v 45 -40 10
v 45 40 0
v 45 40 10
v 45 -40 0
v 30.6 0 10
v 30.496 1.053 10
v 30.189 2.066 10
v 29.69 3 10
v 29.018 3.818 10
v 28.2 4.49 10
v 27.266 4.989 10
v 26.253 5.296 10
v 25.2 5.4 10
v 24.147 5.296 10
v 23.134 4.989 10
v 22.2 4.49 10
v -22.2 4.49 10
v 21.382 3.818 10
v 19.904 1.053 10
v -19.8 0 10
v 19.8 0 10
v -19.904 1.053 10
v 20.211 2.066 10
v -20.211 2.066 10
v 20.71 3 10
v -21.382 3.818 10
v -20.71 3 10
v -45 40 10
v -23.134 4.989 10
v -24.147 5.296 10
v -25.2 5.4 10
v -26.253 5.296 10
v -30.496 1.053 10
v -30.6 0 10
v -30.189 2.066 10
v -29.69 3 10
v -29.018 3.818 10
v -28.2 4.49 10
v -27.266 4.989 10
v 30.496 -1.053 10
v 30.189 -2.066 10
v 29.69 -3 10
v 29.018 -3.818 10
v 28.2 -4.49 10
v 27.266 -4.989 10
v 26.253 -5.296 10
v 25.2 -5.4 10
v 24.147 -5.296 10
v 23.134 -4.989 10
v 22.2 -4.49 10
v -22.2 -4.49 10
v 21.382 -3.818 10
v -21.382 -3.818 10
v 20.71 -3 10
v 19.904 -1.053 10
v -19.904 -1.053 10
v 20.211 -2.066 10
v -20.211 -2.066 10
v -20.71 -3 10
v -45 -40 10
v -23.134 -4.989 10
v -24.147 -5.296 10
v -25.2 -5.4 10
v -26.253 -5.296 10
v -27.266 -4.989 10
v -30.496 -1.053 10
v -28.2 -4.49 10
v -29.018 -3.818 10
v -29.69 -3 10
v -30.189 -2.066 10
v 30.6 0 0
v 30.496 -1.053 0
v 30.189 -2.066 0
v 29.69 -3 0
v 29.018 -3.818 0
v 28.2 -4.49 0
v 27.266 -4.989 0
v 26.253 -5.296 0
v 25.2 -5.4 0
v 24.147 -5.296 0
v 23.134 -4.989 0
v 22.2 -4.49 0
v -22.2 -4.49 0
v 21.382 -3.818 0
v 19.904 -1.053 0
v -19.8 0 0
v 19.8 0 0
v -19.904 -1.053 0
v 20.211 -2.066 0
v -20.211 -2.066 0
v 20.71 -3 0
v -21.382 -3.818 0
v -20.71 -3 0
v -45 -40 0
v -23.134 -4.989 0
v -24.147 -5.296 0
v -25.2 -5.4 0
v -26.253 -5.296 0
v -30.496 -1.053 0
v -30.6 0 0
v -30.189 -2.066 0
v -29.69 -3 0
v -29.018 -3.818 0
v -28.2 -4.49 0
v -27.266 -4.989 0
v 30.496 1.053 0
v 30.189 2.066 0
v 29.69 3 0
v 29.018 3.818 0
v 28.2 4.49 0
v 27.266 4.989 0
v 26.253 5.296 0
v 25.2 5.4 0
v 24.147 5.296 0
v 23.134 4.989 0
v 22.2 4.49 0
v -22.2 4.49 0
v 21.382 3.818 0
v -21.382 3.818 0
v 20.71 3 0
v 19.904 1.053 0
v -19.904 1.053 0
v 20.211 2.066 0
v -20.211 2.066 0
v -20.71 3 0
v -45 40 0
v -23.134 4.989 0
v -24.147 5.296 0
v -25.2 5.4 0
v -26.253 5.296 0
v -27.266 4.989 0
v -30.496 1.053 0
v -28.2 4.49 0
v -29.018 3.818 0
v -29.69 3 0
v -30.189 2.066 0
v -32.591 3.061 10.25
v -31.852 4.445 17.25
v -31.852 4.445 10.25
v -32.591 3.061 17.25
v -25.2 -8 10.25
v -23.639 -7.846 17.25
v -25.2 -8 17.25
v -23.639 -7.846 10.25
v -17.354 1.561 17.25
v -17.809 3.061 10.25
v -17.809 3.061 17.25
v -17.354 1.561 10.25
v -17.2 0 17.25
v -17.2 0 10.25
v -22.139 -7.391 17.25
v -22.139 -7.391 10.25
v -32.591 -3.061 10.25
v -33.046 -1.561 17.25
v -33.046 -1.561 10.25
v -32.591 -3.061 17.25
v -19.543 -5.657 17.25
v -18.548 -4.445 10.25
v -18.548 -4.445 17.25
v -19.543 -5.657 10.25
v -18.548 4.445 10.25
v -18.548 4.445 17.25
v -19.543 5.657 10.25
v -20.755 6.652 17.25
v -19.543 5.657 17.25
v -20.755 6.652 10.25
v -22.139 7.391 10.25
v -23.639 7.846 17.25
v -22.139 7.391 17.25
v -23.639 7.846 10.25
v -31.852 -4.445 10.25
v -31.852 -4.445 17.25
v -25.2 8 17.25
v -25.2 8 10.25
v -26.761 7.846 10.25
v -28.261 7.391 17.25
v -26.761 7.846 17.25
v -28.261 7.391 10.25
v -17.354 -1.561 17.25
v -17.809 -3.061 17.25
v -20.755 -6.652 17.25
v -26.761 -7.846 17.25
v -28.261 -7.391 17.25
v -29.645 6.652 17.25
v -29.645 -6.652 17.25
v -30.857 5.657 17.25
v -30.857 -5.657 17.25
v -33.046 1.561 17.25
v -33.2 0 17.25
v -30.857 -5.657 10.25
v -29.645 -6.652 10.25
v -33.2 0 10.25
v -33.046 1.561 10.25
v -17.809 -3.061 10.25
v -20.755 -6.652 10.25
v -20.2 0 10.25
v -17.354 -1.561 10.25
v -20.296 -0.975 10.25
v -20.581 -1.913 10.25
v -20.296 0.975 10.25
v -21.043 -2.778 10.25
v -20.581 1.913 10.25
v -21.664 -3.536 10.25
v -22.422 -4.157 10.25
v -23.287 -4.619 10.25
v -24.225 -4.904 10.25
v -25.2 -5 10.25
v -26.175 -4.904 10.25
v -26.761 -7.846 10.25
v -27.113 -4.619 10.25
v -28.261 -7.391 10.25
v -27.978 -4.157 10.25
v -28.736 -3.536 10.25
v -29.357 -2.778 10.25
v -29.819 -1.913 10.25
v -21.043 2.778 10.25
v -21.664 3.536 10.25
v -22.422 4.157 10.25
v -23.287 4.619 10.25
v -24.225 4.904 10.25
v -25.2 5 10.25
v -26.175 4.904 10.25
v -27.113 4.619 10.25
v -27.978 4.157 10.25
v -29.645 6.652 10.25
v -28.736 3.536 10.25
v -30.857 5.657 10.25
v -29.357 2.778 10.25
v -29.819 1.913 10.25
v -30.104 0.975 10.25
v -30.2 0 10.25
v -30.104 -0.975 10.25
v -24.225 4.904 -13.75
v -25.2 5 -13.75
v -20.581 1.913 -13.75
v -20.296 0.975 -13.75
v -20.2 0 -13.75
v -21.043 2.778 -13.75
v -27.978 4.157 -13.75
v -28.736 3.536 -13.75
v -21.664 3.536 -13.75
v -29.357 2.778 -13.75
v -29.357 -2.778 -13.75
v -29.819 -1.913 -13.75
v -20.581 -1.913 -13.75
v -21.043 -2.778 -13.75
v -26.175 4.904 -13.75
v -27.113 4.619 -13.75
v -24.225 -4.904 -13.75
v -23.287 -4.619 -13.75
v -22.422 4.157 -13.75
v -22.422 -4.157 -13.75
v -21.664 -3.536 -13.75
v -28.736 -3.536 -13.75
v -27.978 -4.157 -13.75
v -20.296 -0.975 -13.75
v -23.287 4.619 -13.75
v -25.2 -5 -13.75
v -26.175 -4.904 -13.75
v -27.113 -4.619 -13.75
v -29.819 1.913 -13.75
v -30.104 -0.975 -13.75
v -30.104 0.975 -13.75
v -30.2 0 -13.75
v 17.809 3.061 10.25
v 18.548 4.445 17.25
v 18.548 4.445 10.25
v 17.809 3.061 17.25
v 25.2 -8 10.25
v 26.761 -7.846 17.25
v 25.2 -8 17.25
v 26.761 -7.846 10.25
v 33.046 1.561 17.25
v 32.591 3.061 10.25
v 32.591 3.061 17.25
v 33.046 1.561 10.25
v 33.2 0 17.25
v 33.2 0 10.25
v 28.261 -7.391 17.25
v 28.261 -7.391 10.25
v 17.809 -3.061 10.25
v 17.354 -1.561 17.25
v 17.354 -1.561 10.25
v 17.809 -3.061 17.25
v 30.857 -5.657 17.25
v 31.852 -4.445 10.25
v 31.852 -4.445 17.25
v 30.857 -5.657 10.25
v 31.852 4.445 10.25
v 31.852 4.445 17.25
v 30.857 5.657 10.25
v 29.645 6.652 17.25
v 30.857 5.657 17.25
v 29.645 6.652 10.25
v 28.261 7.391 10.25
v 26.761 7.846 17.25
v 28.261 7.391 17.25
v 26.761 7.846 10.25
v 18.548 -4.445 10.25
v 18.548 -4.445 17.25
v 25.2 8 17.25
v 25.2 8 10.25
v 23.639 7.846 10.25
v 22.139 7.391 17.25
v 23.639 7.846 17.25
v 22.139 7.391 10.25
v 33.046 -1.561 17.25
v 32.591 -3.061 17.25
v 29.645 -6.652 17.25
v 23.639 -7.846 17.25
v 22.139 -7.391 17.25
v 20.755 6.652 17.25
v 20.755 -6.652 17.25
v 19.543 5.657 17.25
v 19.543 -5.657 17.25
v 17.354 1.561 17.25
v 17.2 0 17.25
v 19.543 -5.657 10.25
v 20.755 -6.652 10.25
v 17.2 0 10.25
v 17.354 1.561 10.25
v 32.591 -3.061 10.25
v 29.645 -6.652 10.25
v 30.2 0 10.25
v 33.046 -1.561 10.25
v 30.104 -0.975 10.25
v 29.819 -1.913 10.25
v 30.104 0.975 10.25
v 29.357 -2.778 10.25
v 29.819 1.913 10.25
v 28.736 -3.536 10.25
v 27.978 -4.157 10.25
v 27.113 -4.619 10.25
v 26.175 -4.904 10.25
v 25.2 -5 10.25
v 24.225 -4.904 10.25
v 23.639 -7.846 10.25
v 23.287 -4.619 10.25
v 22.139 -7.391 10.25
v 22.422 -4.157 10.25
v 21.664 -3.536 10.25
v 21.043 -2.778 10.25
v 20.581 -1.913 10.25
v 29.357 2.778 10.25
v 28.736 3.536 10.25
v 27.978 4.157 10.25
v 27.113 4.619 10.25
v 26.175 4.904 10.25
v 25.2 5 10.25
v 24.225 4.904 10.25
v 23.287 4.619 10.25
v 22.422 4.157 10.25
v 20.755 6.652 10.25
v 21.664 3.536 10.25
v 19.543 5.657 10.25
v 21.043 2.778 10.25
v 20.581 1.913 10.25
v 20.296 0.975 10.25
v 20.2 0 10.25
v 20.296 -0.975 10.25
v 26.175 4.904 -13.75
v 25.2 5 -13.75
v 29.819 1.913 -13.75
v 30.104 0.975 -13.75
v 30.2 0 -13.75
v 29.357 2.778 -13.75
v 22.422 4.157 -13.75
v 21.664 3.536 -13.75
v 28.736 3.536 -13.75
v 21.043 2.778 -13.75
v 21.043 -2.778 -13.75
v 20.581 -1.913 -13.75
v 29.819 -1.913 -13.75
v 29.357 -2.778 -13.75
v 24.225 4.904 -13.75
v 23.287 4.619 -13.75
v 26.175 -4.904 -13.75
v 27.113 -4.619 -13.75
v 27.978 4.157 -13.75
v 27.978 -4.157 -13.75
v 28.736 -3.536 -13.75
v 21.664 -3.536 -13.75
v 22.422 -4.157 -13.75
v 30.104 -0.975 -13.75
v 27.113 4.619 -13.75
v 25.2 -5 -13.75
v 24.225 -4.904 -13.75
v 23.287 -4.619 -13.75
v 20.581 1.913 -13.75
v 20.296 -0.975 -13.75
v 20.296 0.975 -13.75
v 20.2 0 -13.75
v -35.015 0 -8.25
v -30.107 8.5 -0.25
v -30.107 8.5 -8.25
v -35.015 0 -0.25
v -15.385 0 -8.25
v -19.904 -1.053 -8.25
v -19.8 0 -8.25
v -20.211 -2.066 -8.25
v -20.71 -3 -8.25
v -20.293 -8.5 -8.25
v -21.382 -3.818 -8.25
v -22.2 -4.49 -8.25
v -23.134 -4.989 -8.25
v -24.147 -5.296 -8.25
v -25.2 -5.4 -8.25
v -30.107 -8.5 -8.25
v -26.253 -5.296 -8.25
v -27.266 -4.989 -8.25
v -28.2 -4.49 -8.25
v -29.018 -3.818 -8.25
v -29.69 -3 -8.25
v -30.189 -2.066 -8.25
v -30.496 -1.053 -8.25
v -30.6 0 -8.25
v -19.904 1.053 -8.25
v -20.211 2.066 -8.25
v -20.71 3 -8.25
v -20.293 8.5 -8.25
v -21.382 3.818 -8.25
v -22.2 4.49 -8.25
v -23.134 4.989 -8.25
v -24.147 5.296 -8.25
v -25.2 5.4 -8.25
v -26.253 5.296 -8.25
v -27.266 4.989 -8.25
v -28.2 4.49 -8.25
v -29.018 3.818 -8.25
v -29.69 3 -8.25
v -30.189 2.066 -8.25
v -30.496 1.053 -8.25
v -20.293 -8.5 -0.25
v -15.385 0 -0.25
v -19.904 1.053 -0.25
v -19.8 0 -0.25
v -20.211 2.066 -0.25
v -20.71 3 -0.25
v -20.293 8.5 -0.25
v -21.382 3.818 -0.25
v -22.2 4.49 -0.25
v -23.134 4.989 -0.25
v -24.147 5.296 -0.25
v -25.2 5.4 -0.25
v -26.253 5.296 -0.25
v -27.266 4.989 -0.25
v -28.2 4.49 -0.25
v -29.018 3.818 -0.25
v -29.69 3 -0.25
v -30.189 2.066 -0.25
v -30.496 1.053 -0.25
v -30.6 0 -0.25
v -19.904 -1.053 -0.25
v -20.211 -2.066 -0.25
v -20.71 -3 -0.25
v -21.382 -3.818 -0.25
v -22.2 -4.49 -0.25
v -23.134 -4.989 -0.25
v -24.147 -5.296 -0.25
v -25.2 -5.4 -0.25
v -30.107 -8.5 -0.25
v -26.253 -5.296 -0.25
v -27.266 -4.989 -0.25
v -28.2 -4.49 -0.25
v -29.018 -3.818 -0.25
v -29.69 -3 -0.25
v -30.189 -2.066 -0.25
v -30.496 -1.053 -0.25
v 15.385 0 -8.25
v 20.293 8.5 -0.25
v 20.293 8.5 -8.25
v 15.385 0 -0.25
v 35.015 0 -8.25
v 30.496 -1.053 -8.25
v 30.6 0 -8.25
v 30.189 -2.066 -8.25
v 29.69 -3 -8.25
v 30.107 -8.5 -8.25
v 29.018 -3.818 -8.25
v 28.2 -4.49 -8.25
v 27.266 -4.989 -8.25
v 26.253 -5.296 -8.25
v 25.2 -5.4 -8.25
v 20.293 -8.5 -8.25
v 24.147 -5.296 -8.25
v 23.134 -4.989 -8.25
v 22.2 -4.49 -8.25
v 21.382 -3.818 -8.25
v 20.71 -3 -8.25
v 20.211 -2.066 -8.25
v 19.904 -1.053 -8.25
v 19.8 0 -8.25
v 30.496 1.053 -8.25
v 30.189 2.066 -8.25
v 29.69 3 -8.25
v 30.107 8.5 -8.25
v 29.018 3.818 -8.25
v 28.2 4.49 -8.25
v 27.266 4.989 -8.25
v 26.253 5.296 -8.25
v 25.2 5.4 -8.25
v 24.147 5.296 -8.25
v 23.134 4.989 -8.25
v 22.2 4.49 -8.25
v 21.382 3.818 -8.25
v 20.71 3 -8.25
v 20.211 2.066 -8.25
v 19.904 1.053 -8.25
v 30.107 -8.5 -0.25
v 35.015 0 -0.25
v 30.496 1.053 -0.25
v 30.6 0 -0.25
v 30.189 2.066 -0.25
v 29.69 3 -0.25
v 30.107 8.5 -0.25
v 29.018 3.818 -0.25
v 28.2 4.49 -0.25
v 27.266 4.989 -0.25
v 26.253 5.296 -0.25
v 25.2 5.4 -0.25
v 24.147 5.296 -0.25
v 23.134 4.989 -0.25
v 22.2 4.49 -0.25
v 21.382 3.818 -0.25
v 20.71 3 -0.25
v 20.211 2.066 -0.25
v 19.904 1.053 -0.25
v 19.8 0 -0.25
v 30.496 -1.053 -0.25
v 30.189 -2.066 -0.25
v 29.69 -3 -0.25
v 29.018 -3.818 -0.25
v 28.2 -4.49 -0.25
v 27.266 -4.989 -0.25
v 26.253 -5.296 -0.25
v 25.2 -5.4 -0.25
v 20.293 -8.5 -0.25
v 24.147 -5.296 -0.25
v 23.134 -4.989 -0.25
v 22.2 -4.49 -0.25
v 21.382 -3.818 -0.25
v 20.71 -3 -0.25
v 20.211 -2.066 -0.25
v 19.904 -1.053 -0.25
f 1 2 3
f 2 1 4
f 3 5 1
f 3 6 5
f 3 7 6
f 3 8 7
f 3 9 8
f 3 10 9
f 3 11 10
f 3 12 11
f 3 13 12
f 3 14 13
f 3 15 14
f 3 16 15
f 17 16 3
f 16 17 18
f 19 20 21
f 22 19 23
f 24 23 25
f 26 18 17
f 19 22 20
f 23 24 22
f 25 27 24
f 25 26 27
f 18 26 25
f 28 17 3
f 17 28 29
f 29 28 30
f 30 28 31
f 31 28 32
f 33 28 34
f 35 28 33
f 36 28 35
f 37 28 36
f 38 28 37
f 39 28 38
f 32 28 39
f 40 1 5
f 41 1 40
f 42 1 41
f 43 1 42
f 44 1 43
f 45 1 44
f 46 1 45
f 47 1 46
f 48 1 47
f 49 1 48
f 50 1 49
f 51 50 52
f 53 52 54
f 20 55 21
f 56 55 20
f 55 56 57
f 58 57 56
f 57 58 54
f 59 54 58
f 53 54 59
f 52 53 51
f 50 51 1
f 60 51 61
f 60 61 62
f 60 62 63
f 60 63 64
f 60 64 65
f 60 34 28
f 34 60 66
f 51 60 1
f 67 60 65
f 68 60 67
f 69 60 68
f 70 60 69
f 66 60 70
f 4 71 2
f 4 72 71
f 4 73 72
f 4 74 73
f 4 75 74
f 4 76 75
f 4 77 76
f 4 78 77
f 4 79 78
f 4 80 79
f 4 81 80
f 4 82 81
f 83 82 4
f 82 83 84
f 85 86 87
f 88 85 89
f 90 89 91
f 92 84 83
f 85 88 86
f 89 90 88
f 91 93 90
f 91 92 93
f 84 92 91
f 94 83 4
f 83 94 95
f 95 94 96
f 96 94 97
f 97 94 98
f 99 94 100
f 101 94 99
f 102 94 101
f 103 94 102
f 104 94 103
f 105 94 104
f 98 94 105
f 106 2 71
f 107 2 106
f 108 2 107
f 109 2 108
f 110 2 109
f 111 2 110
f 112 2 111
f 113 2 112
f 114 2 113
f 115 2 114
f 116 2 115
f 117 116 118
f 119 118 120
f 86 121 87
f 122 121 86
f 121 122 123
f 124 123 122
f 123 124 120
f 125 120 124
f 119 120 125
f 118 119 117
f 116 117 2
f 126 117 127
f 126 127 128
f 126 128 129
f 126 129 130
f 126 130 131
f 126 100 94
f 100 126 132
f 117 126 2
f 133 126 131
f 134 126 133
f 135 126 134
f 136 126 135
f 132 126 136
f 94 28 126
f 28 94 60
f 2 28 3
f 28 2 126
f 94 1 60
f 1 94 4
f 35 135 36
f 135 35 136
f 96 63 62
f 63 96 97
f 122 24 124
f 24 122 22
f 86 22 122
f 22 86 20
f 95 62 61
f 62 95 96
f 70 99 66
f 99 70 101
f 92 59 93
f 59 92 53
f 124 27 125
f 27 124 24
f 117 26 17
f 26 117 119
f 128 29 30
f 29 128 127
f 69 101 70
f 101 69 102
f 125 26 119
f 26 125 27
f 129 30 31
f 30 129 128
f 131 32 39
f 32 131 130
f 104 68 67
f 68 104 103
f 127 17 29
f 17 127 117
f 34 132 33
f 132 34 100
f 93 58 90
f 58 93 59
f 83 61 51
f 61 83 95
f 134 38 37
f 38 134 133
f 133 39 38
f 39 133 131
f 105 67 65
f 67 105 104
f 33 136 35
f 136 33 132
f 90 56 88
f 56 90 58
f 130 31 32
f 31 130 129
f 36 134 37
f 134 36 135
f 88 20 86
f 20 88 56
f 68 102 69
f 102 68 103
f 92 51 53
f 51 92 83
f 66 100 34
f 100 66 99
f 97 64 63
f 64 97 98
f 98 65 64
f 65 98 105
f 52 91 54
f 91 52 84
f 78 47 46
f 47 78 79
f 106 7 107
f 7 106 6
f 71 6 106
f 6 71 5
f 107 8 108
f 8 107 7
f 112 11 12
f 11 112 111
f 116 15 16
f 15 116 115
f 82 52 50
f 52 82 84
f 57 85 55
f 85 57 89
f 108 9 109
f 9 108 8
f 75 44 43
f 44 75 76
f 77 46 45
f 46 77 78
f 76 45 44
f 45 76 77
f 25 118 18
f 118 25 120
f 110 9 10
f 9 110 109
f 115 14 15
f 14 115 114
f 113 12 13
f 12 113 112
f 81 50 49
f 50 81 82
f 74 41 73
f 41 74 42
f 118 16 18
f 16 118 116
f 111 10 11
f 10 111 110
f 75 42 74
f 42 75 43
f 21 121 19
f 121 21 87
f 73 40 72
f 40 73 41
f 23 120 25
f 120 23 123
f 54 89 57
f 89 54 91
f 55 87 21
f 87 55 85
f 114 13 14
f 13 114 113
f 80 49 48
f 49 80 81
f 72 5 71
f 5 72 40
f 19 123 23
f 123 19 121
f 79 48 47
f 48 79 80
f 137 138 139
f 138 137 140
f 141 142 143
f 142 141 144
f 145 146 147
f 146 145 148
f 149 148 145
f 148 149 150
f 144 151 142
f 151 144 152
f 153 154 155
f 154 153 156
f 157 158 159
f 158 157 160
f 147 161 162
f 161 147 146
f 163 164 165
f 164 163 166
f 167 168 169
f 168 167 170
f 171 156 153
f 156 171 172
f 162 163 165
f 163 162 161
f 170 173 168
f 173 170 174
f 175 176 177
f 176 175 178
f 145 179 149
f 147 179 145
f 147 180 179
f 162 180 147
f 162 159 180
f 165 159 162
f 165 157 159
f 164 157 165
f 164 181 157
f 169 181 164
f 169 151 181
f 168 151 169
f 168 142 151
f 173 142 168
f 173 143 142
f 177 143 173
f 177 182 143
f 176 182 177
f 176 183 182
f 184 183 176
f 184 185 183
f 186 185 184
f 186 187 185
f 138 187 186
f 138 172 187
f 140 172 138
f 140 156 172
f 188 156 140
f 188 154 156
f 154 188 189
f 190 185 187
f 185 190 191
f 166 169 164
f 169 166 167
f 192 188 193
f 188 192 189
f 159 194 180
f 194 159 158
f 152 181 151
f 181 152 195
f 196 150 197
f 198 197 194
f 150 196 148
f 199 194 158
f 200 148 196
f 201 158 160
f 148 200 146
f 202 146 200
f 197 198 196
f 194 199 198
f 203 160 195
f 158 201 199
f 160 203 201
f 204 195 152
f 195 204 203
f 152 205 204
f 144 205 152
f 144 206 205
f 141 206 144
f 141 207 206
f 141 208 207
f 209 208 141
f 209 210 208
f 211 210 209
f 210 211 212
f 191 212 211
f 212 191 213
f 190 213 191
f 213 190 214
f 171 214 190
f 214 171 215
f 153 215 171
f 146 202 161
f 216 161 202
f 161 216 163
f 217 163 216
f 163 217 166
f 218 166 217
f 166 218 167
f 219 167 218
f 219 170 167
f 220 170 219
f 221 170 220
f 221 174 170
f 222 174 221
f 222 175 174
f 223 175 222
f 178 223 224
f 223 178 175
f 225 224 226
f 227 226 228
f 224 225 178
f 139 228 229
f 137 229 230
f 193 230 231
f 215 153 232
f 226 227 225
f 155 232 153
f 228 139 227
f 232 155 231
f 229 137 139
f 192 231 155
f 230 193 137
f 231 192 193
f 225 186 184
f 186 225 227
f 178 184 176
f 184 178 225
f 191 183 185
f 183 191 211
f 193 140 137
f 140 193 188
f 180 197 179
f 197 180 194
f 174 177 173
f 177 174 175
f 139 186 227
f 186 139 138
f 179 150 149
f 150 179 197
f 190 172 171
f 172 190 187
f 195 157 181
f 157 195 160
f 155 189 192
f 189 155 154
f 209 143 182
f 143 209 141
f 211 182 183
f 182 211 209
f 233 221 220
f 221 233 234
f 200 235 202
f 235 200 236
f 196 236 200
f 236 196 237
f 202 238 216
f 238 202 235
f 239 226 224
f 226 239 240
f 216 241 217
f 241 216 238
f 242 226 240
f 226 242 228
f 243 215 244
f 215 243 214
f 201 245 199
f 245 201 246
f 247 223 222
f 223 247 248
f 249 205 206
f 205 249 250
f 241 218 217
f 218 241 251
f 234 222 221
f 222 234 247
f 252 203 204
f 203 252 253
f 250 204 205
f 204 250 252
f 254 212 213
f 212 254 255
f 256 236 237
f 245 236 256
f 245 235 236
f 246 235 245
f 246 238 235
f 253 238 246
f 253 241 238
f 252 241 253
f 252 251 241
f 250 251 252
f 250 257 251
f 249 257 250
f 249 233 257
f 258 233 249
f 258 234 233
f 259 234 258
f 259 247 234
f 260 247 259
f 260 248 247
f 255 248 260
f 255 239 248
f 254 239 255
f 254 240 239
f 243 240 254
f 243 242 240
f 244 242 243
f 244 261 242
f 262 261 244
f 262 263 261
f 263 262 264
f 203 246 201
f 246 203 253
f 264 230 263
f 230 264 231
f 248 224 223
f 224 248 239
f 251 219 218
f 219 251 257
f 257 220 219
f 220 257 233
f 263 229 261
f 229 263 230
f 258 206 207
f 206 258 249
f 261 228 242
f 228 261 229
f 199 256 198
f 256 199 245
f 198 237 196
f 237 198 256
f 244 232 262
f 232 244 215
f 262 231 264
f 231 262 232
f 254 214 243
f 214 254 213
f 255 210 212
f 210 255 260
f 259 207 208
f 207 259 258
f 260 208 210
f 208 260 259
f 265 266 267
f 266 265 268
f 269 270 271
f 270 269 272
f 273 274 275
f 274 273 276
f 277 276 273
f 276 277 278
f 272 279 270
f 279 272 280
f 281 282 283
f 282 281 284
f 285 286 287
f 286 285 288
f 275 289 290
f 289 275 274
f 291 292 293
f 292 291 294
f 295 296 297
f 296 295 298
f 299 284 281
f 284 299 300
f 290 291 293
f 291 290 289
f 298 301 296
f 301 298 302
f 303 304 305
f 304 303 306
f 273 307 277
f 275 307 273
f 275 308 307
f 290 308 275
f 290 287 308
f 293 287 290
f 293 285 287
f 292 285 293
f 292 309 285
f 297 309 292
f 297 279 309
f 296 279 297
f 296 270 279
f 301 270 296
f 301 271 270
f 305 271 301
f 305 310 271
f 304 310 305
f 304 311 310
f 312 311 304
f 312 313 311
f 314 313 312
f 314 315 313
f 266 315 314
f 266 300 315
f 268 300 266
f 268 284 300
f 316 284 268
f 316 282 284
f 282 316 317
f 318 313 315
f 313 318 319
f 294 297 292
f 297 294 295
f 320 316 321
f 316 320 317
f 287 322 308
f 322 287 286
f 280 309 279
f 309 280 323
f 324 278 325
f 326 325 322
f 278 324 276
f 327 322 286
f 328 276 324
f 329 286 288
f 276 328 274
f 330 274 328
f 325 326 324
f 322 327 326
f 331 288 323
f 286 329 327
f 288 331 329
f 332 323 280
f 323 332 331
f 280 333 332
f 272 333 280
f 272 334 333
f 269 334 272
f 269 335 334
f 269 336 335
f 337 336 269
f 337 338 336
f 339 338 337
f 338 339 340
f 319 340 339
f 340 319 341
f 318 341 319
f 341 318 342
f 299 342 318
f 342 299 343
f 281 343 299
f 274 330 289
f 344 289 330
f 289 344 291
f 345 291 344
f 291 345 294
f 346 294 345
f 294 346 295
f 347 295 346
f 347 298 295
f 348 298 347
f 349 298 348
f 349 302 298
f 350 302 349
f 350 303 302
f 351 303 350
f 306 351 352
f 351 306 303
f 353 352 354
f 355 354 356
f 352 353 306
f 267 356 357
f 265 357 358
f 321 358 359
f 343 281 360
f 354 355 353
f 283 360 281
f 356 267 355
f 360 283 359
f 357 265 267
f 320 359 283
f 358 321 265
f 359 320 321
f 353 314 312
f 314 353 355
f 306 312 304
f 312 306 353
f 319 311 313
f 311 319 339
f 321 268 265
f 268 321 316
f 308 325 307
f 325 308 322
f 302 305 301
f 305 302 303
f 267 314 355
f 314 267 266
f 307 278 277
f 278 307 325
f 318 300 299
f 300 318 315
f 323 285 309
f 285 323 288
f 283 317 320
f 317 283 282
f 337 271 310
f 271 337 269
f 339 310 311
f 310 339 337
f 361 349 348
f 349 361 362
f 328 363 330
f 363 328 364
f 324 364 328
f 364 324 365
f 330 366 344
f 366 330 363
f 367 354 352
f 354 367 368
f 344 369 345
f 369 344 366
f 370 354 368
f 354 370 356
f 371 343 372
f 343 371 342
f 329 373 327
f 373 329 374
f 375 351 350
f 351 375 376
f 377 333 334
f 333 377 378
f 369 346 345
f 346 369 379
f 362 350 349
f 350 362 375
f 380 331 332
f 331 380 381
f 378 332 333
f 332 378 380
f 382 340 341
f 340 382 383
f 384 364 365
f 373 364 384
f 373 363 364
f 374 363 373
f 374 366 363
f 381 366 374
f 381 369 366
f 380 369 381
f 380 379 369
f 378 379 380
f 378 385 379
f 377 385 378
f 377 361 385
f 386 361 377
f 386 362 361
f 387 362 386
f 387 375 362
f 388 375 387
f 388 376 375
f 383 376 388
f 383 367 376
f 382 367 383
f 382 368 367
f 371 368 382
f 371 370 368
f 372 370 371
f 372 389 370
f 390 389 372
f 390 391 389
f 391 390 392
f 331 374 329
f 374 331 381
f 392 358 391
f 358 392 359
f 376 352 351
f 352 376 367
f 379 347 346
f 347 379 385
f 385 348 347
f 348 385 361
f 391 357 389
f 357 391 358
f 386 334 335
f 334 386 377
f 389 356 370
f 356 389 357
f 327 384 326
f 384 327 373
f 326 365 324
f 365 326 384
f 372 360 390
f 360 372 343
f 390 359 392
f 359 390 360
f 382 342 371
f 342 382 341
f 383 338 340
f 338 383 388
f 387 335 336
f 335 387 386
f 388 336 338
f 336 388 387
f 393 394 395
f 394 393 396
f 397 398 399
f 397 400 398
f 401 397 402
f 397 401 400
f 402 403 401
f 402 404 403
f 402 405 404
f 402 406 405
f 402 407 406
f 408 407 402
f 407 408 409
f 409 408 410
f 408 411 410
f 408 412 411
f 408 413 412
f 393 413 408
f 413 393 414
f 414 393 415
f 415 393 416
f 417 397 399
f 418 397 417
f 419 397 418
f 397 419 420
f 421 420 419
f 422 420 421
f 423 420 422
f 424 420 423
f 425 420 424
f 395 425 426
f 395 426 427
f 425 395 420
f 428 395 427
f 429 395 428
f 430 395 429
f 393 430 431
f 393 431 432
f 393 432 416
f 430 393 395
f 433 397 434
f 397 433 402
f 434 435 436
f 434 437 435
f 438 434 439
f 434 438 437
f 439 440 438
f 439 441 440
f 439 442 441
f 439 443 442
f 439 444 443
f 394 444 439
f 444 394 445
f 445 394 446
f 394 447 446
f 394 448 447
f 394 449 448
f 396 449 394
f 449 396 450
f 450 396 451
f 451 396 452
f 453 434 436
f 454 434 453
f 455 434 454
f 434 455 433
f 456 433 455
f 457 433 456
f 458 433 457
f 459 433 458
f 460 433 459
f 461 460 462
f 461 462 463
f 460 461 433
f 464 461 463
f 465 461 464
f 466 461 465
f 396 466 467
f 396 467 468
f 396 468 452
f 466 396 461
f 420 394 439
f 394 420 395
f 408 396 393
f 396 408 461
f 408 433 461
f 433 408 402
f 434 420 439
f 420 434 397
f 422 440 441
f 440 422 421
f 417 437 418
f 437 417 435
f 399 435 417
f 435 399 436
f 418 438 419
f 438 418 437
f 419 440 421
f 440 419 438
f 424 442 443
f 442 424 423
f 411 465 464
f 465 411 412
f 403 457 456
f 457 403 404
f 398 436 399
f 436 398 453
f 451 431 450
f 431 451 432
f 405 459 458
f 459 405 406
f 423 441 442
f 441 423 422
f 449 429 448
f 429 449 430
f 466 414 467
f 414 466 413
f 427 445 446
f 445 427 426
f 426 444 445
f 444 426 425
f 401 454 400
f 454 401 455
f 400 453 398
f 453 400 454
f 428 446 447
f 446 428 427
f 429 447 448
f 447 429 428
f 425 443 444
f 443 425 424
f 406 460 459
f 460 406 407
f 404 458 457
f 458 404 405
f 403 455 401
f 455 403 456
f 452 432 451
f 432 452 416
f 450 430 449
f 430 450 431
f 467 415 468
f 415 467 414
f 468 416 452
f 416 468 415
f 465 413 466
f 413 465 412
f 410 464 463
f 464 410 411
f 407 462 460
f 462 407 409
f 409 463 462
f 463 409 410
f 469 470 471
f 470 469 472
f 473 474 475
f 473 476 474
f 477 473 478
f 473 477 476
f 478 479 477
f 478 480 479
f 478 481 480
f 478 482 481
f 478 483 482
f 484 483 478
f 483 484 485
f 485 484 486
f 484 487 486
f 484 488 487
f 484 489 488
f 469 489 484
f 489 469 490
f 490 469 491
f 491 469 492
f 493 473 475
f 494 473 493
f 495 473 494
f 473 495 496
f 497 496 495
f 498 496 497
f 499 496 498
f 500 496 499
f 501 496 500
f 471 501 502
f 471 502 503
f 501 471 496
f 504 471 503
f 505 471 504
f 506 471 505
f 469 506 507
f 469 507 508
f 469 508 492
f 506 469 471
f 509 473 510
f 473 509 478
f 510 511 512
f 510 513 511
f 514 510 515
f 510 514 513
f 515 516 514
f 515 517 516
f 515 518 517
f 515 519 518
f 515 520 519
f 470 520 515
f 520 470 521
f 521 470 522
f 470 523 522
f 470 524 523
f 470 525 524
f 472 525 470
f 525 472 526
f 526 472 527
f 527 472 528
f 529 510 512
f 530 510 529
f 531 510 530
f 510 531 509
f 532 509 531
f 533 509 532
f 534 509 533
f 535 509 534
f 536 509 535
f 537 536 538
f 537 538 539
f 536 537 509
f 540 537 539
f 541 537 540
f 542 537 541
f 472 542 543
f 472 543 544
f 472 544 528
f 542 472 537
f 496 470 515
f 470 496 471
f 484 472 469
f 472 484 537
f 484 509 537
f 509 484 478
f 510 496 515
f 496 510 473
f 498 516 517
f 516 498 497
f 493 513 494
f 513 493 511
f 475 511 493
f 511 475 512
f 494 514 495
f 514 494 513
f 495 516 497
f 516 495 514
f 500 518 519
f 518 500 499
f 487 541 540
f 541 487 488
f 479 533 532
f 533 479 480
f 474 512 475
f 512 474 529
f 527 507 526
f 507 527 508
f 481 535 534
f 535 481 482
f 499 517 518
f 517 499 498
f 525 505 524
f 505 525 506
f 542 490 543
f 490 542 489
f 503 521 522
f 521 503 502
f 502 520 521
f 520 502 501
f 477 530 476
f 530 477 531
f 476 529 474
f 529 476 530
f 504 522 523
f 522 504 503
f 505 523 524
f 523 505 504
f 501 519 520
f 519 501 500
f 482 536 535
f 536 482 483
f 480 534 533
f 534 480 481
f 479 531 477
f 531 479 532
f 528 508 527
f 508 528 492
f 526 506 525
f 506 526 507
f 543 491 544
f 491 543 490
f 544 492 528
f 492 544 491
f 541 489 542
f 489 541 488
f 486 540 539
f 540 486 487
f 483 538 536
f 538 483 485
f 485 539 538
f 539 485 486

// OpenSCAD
$fn = 32;

// ------------------------------------------------------------------------
// Bolted plate: 90 x 80 x 10 mm plate, 2 fasteners
// Every part is its own module, assembly() places them once.
// ------------------------------------------------------------------------

// --- part 1 ---
module plate() {
  difference() {
    translate([-45, -40, 0]) cube([90, 80, 10]);
    translate([-25.2, 0, -1]) cylinder(h = 12, d = 10.8);
    translate([25.2, 0, -1]) cylinder(h = 12, d = 10.8);
  }
}

// --- part 2 ---
module bolt1() {
  cylinder(h = 7, d = 16);
  translate([0, 0, -24]) cylinder(h = 24, d = 10);
}

// --- part 3 ---
module bolt2() {
  cylinder(h = 7, d = 16);
  translate([0, 0, -24]) cylinder(h = 24, d = 10);
}

// --- part 4 ---
module nut1() {
  difference() {
    linear_extrude(height = 8) polygon(points = [[9.815, 0], [4.907, 8.5], [-4.907, 8.5], [-9.815, 0], [-4.907, -8.5], [4.907, -8.5]]);
    translate([0, 0, -1]) cylinder(h = 10, d = 10.8);
  }
}

// --- part 5 ---
module nut2() {
  difference() {
    linear_extrude(height = 8) polygon(points = [[9.815, 0], [4.907, 8.5], [-4.907, 8.5], [-9.815, 0], [-4.907, -8.5], [4.907, -8.5]]);
    translate([0, 0, -1]) cylinder(h = 10, d = 10.8);
  }
}

// --- assembly ---
module assembly() {
  translate([0, 0, 0]) rotate([0, 0, 0]) plate();
  translate([-25.2, 0, 10.25]) rotate([0, 0, 0]) bolt1();
  translate([25.2, 0, 10.25]) rotate([0, 0, 0]) bolt2();
  translate([-25.2, 0, -8.25]) rotate([0, 0, 0]) nut1();
  translate([25.2, 0, -8.25]) rotate([0, 0, 0]) nut2();
}

assembly();
